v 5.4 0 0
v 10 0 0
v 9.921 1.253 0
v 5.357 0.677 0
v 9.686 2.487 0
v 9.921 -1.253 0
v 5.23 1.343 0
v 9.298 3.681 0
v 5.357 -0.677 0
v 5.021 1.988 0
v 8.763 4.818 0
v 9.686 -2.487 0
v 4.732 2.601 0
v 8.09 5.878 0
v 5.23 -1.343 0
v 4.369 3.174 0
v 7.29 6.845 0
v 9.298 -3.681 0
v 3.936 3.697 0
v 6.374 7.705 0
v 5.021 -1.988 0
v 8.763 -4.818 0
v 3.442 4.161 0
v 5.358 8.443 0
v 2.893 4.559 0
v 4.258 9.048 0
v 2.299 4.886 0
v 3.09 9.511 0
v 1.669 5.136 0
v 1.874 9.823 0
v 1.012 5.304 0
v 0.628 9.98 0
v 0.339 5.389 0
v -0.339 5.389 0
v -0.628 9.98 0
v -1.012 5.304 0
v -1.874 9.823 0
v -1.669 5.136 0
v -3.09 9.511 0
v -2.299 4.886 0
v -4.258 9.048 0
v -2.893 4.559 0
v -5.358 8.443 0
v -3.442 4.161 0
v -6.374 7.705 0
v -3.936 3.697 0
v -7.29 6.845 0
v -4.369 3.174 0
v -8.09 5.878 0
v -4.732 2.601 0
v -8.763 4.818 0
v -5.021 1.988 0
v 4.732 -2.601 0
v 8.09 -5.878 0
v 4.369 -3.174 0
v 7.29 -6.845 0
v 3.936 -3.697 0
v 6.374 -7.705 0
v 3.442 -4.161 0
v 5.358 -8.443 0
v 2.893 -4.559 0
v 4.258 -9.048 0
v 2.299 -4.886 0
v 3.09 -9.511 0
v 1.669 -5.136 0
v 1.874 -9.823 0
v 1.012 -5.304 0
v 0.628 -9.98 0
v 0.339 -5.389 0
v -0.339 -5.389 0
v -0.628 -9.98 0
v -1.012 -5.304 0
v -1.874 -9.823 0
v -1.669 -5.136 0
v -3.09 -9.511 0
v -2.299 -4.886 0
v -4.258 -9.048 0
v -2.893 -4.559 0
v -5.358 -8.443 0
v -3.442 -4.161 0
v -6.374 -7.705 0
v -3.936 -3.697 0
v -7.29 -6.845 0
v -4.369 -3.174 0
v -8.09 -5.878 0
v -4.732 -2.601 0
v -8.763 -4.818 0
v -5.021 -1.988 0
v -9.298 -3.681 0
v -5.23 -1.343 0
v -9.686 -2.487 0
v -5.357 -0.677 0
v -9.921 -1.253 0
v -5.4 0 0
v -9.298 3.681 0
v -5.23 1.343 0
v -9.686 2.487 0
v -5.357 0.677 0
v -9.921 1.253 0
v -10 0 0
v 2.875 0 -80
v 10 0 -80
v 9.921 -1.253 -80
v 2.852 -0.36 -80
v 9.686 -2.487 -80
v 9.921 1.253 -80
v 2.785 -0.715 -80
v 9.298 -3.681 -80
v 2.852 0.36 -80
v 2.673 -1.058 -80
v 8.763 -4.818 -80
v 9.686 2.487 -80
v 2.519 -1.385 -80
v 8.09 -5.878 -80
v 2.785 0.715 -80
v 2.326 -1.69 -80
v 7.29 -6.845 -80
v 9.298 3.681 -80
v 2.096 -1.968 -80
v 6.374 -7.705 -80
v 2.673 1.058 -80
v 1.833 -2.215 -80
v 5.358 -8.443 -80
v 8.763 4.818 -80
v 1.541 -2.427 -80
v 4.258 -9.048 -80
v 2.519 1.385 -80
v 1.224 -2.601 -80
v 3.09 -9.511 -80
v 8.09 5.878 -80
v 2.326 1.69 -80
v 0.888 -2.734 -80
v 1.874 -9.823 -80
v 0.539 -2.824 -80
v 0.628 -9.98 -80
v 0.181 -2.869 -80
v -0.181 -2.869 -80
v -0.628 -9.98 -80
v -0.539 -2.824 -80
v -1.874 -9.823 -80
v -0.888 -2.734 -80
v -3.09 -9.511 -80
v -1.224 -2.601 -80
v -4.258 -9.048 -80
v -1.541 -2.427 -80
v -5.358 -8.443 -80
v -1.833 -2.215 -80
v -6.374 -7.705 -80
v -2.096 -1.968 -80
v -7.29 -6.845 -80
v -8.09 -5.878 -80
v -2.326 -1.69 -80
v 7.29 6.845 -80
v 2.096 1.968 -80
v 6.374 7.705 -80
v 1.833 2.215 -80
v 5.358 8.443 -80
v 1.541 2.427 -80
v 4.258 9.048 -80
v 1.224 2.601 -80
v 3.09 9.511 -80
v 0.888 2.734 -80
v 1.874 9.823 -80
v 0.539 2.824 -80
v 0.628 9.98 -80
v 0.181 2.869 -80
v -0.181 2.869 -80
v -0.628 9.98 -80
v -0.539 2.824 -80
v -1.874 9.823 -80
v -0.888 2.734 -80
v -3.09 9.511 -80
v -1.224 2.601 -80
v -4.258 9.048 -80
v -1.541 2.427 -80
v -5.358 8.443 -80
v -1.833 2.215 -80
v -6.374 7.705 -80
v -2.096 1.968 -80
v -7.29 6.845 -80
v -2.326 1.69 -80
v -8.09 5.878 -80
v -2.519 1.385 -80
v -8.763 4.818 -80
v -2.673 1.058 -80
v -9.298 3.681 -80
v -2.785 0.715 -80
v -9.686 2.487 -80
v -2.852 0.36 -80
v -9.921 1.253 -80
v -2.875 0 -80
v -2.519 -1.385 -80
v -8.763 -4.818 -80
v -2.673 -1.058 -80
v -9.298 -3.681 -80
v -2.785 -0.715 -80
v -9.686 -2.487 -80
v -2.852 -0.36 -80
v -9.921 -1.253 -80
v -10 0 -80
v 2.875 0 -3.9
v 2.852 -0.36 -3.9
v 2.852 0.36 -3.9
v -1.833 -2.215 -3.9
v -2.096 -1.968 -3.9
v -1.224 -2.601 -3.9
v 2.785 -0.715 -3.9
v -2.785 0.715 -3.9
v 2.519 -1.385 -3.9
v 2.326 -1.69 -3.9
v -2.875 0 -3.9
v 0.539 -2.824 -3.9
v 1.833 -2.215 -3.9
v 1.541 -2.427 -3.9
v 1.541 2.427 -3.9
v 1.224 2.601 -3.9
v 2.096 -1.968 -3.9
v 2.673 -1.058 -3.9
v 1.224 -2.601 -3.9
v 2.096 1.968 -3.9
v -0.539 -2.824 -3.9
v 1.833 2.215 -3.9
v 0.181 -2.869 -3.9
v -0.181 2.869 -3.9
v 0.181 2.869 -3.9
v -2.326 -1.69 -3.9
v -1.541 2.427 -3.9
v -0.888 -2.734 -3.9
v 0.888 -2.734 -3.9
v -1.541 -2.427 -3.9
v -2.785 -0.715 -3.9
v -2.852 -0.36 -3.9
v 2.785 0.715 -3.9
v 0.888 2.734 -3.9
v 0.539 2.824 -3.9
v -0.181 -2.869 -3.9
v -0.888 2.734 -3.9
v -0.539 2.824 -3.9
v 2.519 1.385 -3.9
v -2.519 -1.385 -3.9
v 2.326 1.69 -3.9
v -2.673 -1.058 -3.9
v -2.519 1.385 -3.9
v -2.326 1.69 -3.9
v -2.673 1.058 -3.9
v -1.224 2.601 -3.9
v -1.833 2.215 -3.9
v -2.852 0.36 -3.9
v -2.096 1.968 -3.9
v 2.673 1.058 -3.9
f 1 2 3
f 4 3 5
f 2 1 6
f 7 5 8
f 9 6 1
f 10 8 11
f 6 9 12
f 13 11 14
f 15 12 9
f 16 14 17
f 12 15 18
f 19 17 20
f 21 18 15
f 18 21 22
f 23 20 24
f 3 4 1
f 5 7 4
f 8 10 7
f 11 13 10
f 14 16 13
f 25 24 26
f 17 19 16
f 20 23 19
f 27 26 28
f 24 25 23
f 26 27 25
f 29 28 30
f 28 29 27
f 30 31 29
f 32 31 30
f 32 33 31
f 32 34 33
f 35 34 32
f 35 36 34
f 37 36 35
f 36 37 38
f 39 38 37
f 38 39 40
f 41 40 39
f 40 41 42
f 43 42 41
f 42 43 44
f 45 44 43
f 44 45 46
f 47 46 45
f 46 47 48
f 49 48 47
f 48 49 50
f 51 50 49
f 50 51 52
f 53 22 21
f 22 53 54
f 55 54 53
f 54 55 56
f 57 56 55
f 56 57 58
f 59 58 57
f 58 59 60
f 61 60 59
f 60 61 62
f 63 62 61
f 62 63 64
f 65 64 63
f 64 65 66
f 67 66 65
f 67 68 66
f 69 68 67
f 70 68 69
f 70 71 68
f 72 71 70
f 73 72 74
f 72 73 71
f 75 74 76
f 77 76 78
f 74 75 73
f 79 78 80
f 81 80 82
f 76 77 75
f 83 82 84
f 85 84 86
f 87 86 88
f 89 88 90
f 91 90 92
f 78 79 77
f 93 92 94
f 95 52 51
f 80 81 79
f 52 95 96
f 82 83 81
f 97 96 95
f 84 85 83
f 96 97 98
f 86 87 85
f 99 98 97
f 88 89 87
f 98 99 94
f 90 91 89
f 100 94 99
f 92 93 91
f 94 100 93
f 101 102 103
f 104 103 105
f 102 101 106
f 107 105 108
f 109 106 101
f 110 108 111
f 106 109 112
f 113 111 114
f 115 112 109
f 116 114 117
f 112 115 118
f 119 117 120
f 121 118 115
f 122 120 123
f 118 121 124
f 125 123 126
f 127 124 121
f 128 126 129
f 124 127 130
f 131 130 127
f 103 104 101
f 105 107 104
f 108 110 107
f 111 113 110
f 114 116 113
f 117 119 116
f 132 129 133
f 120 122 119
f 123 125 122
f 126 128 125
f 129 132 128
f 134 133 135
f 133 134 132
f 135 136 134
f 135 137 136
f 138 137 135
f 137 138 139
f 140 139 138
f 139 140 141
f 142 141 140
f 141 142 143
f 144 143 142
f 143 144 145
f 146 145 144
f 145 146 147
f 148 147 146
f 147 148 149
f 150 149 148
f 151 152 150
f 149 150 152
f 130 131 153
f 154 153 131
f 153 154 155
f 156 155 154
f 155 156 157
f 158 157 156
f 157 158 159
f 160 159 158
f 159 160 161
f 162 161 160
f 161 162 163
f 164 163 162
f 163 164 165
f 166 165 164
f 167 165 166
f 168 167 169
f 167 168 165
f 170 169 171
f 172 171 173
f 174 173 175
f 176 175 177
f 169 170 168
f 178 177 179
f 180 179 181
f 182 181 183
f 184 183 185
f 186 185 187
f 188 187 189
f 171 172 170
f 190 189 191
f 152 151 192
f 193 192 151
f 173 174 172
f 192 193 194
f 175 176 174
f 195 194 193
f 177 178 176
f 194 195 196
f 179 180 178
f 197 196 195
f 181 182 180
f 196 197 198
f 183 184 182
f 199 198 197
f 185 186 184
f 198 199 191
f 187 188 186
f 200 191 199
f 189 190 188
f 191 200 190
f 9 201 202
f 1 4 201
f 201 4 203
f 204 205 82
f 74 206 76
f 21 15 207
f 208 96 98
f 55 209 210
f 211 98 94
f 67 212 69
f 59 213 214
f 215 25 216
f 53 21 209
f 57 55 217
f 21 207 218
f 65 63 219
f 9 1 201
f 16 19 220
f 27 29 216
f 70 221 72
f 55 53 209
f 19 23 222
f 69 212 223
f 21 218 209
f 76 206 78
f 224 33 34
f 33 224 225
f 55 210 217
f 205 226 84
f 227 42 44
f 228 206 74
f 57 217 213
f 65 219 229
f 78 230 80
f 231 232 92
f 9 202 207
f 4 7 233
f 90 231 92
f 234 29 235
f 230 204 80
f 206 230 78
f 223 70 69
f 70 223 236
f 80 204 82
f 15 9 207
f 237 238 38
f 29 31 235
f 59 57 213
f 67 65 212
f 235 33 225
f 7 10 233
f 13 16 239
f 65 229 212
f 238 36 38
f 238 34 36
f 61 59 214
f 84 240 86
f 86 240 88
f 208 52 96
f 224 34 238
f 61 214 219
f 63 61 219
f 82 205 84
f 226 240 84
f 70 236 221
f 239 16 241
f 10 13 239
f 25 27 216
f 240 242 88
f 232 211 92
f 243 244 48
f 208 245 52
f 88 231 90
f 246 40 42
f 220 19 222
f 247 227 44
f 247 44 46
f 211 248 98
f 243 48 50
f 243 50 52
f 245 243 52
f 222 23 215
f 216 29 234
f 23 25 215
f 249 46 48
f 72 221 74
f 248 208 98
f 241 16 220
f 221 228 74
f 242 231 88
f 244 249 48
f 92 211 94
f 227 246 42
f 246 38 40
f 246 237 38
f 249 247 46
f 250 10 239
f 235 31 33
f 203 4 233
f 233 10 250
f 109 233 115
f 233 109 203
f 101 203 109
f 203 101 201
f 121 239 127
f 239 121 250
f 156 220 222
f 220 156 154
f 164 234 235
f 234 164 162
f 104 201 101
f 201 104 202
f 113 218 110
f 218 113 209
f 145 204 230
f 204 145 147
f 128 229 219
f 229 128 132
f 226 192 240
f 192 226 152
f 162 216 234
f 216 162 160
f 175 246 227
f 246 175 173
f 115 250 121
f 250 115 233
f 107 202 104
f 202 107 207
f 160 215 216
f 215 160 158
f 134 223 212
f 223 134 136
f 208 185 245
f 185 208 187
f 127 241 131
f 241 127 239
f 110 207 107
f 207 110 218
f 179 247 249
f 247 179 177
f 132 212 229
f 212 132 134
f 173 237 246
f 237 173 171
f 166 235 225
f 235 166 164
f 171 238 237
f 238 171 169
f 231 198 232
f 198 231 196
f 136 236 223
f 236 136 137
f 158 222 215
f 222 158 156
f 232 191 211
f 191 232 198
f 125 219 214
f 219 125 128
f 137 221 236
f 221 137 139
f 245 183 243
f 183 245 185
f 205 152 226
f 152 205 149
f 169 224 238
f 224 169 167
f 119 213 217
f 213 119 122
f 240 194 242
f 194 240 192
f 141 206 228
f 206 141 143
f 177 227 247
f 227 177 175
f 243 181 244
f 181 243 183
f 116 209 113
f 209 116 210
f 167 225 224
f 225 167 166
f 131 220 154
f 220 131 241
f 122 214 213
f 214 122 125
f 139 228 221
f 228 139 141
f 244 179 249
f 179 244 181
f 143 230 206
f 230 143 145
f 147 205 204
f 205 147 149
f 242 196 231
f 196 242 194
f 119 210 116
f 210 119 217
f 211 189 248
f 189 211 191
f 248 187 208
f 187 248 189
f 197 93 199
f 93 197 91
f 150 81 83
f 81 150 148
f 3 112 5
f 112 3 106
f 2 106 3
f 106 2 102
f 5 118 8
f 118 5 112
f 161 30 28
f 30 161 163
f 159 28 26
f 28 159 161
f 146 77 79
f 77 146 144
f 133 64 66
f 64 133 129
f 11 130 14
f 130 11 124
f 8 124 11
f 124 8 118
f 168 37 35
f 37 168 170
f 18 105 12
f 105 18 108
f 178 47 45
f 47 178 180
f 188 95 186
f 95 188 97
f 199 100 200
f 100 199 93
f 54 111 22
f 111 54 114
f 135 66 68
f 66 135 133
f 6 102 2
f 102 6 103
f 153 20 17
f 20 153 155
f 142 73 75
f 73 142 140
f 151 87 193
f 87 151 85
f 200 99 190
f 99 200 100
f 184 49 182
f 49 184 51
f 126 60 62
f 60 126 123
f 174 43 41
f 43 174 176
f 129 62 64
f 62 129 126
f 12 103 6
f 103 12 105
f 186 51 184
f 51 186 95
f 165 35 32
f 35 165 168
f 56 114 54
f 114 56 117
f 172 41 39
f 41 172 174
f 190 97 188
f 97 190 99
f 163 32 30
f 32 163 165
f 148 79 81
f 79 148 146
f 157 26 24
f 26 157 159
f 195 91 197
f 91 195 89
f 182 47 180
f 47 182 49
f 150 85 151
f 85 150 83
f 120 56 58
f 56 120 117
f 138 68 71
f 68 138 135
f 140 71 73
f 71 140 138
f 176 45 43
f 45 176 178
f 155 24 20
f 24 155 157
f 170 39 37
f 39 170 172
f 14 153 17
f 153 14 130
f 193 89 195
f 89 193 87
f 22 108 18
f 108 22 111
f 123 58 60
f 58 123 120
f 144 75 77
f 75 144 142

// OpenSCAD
$fn = 50;


difference() {
	union() {
		translate(v = [0, 0, -80.0000000000]) {
			cylinder(h = 80, r = 10.0000000000);
		}
		cylinder(h = 0, r = 16.0000000000);
	}
	union() {
		translate(v = [0, 0, 0]) {
			rotate(a = [0, 0, 0]) {
				difference() {
					union() {
						#translate(v = [0, 0, -80.0000000000]) {
							cylinder(h = 80, r = 2.6000000000);
						}
						#translate(v = [0, 0, -3.9000000000]) {
							cylinder(h = 3.9000000000, r1 = 2.8750000000, r2 = 5.4000000000);
						}
						#translate(v = [0, 0, -80.0000000000]) {
							cylinder(h = 80, r = 2.8750000000);
						}
						#translate(v = [0, 0, -80.0000000000]) {
							cylinder(h = 80, r = 2.6000000000);
						}
					}
					union();
				}
			}
		}
	}
}
